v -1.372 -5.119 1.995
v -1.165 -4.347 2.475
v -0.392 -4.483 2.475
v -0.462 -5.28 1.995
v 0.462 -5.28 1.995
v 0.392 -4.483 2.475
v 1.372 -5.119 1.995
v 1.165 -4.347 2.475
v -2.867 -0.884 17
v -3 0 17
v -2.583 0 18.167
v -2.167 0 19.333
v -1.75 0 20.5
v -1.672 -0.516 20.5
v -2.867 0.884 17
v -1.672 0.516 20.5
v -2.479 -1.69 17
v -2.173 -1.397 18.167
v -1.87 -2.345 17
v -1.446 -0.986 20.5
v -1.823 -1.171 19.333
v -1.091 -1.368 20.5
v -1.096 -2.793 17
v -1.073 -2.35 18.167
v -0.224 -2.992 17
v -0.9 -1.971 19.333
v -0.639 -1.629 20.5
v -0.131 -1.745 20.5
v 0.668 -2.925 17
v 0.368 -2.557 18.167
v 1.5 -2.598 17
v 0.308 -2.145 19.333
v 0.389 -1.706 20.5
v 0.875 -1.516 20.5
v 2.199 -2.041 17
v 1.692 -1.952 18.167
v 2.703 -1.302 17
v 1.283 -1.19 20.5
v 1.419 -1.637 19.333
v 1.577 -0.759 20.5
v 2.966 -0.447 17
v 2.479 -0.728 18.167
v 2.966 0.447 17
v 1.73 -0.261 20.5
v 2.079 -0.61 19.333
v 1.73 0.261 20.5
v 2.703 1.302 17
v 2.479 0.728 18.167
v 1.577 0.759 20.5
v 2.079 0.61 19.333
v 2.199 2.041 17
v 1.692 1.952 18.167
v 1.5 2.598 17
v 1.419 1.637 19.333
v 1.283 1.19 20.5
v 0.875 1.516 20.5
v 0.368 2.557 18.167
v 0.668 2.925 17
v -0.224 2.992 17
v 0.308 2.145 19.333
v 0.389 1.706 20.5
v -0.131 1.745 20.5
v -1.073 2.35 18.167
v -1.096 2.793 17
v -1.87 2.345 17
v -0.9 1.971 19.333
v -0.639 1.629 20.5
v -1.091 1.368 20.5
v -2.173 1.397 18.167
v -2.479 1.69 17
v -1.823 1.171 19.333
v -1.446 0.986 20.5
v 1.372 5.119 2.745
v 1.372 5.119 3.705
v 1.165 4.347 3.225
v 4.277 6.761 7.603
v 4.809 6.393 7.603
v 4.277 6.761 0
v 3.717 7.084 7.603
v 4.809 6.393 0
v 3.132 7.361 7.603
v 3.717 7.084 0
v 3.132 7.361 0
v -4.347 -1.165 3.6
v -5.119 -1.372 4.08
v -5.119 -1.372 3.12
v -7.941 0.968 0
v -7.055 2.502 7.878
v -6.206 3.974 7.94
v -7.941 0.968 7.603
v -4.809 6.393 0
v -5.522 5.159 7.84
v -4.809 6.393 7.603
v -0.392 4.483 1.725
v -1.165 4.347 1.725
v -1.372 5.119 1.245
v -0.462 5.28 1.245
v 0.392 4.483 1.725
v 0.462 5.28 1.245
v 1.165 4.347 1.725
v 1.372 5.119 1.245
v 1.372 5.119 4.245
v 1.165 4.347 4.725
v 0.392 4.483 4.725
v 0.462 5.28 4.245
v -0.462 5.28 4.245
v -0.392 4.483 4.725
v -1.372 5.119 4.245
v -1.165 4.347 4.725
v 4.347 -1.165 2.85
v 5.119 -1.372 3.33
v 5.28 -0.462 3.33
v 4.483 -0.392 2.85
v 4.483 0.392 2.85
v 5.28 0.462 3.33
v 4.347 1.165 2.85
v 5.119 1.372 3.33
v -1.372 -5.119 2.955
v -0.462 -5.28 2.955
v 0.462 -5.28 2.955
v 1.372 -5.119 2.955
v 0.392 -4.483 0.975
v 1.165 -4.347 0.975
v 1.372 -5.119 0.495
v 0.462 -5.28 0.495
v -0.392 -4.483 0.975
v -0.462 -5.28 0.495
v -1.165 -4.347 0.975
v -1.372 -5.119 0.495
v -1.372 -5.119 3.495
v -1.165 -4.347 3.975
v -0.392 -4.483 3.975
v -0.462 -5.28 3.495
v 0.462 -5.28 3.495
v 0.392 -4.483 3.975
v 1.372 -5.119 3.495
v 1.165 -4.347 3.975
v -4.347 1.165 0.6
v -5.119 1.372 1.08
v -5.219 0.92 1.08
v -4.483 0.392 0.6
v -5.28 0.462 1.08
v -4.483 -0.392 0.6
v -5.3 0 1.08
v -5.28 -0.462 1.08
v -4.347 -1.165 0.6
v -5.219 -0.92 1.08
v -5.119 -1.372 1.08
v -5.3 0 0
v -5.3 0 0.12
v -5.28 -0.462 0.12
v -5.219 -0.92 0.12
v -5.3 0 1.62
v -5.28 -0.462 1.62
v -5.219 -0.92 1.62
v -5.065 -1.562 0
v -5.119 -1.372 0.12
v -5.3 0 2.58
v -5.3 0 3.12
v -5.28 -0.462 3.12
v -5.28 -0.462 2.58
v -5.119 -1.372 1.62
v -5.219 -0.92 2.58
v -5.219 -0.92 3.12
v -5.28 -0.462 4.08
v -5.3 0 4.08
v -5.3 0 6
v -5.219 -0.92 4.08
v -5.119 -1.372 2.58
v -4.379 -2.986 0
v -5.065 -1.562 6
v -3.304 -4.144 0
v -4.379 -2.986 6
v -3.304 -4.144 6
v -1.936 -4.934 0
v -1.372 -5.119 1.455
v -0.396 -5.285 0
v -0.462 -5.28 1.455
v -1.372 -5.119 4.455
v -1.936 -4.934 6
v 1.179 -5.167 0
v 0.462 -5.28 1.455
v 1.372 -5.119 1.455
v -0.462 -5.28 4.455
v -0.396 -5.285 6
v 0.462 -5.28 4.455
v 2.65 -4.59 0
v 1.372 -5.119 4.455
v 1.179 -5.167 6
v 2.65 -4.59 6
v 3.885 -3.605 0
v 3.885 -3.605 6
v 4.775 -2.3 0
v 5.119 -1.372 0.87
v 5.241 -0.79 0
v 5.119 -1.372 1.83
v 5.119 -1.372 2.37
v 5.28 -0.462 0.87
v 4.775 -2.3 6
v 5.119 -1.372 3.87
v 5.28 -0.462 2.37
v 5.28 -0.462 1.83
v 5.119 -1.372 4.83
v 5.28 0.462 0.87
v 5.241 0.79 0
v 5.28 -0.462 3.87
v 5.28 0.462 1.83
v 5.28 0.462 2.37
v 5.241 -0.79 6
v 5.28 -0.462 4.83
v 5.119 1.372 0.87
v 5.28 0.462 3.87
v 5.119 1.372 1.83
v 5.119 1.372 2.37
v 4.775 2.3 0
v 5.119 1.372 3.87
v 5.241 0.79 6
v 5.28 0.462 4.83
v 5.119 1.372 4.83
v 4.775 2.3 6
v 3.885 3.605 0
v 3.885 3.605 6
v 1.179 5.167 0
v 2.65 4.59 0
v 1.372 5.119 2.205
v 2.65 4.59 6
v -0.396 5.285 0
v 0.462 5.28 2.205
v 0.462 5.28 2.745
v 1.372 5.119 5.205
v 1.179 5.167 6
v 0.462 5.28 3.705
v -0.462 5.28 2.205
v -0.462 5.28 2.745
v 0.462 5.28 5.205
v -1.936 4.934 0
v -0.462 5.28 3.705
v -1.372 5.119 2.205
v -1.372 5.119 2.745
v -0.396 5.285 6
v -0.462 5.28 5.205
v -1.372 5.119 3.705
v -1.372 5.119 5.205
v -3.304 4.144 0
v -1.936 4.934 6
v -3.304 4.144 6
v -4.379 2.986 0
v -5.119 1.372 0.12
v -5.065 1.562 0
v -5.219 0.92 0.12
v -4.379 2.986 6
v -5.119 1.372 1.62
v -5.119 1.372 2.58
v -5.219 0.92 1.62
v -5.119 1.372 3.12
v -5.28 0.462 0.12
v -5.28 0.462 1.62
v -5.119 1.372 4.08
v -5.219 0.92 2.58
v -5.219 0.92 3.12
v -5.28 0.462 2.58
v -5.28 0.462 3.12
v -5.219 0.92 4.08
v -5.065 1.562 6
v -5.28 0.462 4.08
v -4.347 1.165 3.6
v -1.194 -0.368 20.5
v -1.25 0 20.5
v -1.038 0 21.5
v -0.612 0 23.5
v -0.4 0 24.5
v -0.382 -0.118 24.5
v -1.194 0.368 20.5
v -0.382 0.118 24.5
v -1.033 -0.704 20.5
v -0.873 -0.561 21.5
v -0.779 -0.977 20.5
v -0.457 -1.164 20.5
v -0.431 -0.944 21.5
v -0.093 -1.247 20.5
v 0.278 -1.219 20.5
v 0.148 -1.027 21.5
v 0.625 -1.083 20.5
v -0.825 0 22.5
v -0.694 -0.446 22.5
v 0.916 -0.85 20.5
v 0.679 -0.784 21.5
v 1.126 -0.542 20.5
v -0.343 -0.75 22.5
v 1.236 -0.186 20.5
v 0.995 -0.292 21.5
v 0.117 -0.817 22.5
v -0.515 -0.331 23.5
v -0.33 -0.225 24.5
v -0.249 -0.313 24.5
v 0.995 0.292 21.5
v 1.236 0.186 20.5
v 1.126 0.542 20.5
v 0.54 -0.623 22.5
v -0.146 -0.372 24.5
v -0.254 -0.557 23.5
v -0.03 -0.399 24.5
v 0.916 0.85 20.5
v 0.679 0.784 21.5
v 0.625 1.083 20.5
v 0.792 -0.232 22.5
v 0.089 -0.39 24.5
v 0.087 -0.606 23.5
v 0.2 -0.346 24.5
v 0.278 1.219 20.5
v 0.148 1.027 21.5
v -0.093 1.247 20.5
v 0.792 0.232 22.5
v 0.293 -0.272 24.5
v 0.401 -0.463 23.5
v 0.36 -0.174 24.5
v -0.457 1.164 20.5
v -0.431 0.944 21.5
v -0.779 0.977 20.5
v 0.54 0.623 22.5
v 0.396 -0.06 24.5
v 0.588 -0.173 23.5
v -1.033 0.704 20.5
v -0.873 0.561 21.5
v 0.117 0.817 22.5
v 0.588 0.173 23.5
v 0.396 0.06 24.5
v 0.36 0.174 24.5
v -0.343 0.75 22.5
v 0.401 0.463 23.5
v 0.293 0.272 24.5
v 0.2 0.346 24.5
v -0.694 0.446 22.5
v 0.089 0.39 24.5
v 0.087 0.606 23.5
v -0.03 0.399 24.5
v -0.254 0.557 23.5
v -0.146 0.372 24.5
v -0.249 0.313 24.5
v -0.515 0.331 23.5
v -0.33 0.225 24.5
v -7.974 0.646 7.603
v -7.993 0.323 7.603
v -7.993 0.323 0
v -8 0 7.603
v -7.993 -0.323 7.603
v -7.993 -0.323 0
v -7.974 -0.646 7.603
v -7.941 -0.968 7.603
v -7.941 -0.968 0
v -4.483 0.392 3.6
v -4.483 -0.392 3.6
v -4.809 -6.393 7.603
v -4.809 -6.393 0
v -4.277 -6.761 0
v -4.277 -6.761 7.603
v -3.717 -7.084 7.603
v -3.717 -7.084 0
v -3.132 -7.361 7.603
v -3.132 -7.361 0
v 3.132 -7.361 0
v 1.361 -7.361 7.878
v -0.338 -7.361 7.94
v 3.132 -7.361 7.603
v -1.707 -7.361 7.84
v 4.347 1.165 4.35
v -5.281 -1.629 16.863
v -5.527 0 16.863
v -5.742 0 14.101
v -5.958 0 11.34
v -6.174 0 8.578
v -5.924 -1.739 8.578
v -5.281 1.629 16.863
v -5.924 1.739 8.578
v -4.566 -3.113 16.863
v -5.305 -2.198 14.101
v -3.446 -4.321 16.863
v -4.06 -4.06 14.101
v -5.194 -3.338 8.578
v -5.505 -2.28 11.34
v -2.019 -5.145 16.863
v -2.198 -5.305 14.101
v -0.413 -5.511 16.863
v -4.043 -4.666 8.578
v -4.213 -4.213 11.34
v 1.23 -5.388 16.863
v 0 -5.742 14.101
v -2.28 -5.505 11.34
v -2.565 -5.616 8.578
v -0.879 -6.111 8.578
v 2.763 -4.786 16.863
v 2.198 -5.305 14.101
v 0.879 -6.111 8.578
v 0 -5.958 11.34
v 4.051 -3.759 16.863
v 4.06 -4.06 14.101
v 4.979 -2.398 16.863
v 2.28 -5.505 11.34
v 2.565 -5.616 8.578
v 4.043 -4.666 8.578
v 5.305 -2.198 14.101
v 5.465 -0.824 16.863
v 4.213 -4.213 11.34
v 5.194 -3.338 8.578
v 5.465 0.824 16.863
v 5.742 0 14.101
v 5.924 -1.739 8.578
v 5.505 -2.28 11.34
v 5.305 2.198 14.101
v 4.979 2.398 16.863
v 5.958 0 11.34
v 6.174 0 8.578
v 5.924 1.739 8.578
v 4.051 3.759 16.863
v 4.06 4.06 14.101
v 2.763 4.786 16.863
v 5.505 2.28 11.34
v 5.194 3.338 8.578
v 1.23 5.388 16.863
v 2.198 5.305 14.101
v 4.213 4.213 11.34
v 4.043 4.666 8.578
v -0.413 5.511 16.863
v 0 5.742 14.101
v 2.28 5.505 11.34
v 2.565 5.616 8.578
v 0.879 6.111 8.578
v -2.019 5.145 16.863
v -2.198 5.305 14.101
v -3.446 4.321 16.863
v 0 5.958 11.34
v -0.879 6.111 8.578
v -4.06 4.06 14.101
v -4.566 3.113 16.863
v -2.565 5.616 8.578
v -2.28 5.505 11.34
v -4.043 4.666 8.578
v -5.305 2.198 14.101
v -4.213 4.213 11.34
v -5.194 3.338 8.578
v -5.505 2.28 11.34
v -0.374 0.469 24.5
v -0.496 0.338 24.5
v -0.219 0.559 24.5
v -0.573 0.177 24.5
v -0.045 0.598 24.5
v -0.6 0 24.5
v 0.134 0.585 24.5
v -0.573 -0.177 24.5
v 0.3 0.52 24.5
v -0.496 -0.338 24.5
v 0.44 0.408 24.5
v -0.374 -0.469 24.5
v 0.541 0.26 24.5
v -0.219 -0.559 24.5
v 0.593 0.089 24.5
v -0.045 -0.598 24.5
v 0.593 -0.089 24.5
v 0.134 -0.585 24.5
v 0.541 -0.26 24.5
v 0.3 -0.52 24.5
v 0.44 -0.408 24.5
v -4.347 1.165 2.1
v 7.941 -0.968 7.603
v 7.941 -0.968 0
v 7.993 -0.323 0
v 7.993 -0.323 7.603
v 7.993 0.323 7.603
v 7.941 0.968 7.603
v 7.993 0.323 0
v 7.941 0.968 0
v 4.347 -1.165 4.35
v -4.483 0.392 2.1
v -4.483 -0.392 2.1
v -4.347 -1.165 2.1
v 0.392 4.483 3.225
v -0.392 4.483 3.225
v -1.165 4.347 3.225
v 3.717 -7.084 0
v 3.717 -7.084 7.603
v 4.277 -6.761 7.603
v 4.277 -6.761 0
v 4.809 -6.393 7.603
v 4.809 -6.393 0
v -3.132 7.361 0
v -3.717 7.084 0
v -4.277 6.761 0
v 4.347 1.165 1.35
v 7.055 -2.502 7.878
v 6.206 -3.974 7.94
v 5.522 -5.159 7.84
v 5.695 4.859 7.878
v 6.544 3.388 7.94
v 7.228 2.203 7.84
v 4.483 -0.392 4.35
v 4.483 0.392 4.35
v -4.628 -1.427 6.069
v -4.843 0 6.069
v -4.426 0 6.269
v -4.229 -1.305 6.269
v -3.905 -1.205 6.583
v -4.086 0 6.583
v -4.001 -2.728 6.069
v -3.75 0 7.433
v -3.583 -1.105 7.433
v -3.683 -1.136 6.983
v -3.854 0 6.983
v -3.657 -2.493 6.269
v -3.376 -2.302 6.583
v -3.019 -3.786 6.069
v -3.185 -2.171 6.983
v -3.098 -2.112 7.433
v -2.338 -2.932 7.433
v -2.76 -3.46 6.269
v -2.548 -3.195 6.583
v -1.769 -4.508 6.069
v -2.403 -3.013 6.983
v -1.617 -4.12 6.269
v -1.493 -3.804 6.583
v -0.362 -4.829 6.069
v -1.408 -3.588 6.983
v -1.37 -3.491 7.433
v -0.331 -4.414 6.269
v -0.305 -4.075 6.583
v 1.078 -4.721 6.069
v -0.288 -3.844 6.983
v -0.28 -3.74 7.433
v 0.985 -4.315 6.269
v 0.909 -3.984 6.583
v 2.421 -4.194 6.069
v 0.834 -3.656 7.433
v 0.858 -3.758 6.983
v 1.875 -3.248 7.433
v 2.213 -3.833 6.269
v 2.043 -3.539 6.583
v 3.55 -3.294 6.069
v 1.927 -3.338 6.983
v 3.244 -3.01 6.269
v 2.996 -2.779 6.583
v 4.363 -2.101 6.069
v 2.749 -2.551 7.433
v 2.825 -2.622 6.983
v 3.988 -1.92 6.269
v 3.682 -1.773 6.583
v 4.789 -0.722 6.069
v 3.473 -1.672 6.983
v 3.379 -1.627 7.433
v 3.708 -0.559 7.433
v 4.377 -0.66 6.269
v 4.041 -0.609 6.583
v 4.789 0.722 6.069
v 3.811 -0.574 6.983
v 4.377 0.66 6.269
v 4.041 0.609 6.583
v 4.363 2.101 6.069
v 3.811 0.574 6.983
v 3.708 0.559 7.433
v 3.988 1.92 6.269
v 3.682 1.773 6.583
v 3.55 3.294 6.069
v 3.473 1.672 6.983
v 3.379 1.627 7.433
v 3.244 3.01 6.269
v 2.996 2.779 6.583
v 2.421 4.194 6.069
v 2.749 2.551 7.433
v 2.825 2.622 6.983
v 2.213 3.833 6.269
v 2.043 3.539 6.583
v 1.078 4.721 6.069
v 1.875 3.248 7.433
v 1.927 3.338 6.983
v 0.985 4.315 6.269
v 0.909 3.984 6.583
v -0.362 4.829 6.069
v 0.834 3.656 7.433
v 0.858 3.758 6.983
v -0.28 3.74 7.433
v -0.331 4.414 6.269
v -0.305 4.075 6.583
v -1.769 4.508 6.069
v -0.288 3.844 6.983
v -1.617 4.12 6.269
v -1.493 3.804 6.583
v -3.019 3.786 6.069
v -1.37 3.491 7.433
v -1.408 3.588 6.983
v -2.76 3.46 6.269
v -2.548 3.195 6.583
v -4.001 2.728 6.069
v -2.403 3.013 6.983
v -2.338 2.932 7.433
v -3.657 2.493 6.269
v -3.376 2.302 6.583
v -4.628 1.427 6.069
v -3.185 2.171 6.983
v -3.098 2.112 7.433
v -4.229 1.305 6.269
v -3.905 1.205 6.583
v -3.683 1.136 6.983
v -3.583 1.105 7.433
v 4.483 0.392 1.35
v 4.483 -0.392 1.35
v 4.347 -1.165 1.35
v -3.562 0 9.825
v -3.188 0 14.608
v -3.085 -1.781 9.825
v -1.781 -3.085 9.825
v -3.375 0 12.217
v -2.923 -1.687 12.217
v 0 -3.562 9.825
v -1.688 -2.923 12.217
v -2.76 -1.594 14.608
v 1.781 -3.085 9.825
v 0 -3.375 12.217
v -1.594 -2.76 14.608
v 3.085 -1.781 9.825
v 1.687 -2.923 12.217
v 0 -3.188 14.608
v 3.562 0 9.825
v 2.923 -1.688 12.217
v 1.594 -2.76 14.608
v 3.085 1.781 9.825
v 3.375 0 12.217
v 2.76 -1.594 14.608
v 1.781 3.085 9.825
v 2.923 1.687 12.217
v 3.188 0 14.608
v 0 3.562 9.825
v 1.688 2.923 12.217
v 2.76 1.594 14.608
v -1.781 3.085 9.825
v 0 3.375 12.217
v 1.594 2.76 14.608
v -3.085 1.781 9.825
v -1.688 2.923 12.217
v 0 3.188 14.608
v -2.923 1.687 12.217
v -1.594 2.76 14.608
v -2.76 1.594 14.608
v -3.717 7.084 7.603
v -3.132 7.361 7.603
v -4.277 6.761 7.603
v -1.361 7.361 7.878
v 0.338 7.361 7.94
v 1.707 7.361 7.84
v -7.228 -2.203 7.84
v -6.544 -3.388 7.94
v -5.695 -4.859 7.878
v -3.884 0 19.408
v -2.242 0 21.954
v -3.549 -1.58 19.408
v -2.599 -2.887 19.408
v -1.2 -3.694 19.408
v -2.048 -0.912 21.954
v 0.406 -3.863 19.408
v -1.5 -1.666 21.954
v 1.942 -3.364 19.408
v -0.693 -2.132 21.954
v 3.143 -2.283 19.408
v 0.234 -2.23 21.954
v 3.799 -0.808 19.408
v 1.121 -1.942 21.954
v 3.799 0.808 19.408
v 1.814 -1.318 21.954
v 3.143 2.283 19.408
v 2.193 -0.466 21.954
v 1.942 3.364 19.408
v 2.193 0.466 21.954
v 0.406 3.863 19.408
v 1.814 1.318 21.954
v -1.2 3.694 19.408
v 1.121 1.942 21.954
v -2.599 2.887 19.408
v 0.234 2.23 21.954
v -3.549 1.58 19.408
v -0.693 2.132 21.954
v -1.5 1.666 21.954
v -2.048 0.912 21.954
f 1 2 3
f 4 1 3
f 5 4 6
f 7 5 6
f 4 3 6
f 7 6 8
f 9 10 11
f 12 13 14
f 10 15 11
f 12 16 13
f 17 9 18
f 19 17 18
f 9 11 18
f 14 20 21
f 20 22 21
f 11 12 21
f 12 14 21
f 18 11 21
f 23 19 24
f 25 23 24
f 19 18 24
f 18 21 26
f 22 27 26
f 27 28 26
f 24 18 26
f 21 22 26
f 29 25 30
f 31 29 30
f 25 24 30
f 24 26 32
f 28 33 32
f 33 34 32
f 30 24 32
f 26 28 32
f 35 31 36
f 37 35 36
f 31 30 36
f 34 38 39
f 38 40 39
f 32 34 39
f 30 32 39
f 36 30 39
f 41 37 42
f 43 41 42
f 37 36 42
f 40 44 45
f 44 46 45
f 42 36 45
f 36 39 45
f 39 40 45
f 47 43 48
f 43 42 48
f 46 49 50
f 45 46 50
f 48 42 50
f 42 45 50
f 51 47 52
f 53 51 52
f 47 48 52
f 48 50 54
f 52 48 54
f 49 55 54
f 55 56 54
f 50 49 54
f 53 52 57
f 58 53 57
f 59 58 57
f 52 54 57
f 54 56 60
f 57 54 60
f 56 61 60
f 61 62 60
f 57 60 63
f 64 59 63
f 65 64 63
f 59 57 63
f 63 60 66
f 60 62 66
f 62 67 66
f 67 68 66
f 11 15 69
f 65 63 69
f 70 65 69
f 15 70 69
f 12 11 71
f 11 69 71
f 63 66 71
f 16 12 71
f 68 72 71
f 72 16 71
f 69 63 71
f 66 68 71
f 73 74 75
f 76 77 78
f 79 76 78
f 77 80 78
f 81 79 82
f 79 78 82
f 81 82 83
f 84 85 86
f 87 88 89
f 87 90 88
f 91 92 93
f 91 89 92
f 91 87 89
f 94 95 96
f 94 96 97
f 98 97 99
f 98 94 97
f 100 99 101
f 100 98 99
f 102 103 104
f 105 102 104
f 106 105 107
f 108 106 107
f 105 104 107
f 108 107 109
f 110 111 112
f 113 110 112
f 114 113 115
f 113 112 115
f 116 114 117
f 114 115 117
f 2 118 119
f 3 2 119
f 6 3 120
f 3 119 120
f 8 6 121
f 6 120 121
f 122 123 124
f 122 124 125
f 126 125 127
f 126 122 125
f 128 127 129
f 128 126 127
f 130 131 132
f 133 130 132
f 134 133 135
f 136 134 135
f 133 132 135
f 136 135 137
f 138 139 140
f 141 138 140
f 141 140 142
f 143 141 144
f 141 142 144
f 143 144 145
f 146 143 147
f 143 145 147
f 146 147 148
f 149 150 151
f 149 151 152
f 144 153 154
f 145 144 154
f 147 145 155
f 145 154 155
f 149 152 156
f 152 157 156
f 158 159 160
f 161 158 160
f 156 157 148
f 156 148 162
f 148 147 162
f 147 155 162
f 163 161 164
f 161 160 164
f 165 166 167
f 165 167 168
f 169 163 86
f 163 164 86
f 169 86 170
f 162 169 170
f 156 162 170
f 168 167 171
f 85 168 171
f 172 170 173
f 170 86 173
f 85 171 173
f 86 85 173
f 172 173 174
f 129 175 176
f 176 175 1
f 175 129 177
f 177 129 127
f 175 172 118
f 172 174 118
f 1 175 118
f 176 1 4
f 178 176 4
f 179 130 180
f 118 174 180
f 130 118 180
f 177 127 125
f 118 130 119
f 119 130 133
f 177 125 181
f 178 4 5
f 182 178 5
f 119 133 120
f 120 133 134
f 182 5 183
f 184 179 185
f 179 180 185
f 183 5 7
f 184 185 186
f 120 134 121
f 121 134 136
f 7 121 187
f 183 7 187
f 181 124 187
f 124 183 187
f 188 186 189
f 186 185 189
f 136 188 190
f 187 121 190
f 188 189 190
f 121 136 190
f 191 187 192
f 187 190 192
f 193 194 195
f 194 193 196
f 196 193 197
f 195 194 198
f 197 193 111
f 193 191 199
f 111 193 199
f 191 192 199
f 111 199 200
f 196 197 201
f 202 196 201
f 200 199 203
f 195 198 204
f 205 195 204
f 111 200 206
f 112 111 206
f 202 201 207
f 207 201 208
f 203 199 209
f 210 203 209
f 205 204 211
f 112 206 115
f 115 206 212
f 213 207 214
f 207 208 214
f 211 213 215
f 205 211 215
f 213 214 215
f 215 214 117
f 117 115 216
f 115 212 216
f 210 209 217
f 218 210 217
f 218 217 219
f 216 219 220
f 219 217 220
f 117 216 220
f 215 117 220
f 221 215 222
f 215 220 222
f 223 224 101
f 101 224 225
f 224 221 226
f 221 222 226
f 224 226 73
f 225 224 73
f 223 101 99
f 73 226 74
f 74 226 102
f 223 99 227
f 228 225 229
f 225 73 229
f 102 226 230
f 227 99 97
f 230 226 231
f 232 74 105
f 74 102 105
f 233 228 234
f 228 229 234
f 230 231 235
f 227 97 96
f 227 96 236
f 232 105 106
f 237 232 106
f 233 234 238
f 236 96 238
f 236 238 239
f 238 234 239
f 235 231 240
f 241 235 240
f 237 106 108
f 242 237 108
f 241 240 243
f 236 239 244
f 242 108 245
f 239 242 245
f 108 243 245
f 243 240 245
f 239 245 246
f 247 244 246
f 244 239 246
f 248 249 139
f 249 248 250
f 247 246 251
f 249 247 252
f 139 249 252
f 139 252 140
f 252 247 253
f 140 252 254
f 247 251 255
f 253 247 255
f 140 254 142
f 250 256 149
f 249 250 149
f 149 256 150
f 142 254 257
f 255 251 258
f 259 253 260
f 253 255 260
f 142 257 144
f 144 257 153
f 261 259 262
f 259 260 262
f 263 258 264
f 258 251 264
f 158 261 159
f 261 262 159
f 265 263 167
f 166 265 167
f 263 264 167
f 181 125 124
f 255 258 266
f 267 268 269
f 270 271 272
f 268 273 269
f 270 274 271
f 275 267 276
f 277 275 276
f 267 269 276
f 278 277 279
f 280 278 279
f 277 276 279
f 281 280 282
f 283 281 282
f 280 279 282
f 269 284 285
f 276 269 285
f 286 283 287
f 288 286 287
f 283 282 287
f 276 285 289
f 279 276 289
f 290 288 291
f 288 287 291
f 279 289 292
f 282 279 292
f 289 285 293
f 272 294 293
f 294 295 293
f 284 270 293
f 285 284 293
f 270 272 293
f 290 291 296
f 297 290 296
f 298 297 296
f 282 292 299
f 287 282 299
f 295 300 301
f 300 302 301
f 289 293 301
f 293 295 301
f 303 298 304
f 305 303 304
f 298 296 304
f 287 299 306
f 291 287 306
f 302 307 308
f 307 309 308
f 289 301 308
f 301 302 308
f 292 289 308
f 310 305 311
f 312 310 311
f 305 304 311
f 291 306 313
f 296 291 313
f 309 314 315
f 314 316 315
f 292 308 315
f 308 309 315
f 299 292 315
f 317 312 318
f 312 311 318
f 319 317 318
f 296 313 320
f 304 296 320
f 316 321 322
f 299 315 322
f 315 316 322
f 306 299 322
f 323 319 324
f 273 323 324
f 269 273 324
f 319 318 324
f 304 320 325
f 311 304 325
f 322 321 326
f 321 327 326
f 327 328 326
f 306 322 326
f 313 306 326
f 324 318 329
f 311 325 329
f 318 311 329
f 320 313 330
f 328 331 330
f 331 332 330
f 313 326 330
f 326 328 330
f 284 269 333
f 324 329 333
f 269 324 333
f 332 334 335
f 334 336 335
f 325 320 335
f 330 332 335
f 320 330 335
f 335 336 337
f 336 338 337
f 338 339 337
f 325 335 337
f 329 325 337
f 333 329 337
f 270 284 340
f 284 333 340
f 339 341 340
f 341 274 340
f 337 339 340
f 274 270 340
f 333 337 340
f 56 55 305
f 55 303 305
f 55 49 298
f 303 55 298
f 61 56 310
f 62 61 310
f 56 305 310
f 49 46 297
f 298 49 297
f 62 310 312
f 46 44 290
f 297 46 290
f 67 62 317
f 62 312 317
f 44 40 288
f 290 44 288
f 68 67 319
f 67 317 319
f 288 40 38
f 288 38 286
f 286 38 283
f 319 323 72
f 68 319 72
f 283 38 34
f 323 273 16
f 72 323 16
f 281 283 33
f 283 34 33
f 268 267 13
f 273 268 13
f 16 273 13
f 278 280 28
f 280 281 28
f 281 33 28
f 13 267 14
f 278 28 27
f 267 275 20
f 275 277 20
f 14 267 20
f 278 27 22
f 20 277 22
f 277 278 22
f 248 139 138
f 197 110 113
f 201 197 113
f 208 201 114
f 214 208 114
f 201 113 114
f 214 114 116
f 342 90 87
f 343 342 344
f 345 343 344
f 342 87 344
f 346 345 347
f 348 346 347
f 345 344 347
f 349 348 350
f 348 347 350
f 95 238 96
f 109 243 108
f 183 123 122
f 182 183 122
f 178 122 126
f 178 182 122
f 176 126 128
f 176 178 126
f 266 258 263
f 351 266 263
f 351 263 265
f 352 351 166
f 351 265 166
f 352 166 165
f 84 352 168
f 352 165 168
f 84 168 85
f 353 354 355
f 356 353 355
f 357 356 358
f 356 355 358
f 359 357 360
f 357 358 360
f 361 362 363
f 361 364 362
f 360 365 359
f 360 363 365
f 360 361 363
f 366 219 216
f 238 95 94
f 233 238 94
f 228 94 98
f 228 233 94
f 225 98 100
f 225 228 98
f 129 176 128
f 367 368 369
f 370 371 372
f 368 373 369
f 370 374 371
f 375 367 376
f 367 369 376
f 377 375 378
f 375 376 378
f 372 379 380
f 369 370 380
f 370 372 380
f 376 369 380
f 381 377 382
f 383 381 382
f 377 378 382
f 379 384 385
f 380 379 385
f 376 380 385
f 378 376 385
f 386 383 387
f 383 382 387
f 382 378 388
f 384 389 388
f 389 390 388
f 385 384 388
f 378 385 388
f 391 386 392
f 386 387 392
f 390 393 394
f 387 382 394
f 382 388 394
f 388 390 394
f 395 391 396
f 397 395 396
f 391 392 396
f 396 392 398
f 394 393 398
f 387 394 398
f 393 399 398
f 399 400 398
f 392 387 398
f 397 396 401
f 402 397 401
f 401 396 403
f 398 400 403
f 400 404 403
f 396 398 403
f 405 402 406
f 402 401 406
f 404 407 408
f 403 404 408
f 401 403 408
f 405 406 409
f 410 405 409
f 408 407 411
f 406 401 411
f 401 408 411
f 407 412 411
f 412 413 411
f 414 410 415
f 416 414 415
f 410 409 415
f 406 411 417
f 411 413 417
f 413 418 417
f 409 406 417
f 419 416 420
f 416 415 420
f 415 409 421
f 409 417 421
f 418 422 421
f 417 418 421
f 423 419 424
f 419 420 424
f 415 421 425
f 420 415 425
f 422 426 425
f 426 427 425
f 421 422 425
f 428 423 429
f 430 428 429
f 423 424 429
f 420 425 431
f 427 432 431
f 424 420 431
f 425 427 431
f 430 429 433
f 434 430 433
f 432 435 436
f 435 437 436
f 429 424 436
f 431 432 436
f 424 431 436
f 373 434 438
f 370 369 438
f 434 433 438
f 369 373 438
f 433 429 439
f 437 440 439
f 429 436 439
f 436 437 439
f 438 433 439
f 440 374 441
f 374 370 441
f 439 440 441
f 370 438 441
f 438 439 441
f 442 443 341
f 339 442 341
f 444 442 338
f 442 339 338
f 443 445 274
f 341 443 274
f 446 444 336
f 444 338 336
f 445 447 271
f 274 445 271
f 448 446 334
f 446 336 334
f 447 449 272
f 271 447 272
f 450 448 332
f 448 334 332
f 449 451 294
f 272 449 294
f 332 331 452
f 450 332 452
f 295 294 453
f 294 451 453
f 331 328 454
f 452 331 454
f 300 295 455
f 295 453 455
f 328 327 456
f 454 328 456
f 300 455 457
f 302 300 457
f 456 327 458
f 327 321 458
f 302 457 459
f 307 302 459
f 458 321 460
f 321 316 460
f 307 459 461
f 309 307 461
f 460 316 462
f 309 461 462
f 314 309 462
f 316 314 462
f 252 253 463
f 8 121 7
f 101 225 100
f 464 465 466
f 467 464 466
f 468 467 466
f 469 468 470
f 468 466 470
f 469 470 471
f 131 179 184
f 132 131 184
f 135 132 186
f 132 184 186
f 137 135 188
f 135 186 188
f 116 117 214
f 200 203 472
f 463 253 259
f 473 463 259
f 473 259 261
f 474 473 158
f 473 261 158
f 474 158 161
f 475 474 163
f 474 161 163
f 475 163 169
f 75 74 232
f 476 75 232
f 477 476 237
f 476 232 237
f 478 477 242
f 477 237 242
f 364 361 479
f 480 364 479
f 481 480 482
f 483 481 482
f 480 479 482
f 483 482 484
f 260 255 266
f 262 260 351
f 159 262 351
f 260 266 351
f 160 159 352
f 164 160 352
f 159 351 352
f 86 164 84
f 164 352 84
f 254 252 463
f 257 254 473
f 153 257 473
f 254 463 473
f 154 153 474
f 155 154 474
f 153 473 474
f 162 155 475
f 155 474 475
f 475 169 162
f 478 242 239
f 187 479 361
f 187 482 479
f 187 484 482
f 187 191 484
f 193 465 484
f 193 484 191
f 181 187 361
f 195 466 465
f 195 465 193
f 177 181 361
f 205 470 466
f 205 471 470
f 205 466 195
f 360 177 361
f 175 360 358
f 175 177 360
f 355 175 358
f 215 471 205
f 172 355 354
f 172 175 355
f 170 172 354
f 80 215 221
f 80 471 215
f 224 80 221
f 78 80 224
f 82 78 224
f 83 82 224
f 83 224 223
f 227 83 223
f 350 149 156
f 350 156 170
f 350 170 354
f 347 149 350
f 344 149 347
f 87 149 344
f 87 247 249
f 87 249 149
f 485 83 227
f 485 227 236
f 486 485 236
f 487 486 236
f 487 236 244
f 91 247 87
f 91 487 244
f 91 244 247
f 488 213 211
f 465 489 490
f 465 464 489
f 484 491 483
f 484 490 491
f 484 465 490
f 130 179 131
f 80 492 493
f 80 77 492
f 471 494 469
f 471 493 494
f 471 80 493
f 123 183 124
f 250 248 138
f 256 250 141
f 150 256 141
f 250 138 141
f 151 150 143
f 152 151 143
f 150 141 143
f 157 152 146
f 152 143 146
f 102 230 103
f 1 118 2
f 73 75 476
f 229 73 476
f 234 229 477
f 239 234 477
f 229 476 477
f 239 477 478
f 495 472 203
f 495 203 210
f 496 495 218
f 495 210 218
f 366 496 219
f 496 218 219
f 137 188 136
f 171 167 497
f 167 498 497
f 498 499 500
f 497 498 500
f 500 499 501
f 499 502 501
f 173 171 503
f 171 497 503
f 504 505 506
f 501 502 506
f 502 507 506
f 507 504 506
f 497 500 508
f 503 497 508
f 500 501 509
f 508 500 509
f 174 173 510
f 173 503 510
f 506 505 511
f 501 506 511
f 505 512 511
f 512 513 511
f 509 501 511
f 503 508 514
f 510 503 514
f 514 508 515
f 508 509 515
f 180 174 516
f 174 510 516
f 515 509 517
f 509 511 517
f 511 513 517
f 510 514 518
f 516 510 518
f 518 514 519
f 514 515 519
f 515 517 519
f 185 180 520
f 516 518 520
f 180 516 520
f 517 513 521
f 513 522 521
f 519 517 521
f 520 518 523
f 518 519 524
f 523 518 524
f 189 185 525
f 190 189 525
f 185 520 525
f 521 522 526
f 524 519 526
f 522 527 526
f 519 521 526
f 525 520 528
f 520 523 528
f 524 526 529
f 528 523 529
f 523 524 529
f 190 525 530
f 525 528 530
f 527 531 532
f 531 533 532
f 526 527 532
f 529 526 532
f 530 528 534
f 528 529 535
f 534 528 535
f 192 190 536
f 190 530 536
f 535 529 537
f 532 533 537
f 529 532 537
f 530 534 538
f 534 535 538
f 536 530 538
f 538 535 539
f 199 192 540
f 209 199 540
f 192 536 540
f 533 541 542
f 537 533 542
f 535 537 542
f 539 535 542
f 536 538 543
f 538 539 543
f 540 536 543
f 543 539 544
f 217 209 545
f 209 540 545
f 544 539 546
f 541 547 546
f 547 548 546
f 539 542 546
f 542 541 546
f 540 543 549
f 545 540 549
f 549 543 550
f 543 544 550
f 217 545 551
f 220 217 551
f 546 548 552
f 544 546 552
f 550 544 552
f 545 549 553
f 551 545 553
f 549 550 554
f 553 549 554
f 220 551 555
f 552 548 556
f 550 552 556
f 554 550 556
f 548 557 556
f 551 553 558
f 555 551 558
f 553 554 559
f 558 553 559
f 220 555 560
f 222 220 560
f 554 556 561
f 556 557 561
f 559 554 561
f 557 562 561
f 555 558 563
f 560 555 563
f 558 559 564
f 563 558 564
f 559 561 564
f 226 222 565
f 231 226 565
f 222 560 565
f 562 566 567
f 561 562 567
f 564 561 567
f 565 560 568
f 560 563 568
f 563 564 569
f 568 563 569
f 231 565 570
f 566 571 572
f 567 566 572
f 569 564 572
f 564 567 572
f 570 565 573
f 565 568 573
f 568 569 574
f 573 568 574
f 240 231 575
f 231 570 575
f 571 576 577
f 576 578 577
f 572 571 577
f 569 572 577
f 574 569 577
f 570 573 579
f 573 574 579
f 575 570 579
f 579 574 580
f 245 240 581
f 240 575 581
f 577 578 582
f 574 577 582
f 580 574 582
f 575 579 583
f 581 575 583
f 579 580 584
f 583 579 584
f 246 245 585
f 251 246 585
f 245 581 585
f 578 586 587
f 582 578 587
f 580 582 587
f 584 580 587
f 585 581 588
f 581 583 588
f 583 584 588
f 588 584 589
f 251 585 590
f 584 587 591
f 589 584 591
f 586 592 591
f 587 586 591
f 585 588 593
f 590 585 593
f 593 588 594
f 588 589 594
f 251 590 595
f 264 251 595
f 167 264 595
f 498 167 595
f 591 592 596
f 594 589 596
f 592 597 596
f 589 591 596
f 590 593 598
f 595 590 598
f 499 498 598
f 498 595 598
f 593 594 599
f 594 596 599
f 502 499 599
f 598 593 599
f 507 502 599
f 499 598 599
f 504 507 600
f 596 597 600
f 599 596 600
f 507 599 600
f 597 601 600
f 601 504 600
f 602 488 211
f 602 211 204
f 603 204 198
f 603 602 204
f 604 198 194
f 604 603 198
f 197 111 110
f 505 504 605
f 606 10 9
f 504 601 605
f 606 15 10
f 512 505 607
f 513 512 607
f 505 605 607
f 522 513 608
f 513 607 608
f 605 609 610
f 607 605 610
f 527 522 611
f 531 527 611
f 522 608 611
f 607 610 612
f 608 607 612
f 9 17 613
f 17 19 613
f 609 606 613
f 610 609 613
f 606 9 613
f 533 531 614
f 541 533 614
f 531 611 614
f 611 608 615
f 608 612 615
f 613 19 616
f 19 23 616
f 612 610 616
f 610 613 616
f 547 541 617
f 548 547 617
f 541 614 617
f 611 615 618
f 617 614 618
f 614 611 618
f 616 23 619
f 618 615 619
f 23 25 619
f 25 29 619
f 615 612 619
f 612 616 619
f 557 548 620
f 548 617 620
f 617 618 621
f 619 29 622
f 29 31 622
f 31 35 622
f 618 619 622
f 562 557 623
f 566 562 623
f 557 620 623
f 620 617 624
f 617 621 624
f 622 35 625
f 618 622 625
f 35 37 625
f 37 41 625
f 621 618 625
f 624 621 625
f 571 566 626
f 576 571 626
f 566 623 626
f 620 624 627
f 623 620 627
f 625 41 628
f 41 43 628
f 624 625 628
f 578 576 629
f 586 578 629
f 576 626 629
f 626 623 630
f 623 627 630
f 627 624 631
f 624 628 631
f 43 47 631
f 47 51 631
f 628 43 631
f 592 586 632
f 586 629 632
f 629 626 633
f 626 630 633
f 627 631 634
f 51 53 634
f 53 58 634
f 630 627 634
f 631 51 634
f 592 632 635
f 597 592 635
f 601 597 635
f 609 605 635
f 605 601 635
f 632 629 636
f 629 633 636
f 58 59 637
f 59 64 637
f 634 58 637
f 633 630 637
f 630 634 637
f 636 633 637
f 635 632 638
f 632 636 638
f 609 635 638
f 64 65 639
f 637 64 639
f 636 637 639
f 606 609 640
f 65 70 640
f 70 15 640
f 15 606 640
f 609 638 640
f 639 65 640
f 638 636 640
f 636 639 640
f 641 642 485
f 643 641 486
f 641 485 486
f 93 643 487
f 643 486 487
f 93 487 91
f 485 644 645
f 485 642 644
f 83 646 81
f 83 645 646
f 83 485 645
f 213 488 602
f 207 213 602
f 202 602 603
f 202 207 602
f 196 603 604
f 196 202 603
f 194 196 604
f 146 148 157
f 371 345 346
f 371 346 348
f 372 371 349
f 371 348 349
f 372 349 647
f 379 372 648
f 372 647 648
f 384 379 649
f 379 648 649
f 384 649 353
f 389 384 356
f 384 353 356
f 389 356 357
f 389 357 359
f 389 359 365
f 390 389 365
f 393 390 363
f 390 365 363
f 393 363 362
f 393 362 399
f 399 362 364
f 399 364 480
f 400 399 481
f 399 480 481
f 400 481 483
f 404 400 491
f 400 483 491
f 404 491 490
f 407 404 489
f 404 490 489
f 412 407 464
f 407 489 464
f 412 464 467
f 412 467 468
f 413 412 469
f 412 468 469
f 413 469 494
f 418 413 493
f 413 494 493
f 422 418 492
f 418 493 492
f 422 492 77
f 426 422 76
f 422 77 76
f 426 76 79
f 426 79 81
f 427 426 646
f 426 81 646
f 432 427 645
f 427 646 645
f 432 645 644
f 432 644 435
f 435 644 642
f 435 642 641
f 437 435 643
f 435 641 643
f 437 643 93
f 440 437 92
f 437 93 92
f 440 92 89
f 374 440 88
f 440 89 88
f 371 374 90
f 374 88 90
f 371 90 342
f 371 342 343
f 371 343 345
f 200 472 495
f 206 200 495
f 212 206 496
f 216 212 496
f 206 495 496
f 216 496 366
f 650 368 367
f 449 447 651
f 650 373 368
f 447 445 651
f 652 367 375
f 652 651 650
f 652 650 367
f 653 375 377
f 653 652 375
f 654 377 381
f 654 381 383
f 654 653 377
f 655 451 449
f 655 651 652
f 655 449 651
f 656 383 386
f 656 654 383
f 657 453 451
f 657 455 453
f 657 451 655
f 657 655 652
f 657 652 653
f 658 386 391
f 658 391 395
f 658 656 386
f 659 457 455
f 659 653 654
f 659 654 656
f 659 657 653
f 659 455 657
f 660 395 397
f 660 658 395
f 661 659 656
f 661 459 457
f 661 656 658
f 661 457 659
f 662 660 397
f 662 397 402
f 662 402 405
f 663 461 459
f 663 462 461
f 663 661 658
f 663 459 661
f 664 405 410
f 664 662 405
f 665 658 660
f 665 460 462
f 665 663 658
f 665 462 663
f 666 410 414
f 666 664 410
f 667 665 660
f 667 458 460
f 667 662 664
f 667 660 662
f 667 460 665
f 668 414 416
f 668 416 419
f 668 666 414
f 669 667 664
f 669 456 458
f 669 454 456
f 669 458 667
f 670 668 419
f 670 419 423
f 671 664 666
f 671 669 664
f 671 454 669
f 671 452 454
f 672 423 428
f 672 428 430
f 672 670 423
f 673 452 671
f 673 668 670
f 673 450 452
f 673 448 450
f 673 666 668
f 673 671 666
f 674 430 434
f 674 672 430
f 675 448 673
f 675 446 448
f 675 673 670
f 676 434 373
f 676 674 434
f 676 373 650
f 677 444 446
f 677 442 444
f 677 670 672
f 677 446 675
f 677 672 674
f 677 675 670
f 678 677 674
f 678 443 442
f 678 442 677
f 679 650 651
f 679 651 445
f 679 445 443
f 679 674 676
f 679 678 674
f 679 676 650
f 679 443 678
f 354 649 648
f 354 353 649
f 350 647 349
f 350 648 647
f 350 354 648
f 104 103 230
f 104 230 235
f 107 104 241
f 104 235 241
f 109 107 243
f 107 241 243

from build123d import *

# Parameters (mm, degrees)
SKETCH001_R         = 14.291544
POCKET_DEPTH        = 24.501
REVOLUTION001_ANGLE = 30
REVOLUTION002_ANGLE = 30
REVOLUTION003_ANGLE = 30
REVOLUTION004_ANGLE = 30


with BuildPart() as part:
    # Sketch → Revolution (revolve)
    with BuildSketch(Plane.XZ):
        with BuildLine():
            Line((-5.3, 0), (-5.3, 6))
            ThreePointArc((-5.3, 6), (-4.244457, 6.413224), (-3.75, 7.433241))
            Line((-3.75, 7.433241), (-3, 17))
            Line((-3, 17), (-1.75, 20.5))
            Line((-1.75, 20.5), (-1.25, 20.5))
            Line((-1.25, 20.5), (-0.4, 24.5))
            Line((-0.4, 24.5), (-0.6, 24.5))
            Line((-5.526565, 16.862743), (-0.6, 24.5))
            Line((-5.526565, 16.862743), (-6.174059, 8.578152))
            Line((-6.174059, 8.578152), (-8, 7.60349))
            Line((-8, 7.60349), (-8, 0))
            Line((-5.3, 0), (-8, 0))
        make_face()
    revolve(axis=Axis((0, 0, 0), (0, 0, 1)))

    # Sketch001 (on Face12 of Revolution) → Pocket (cut, through all)
    with BuildSketch(Plane(origin=(0, 0, 0), x_dir=(1, 0, 0), z_dir=(0, 0, -1))):
        Circle(SKETCH001_R)
        Polygon((8.5, 0), (4.25, 7.361216), (-4.25, 7.361216), (-8.5, 0), (-4.25, -7.361216), (4.25, -7.361216), align=None, mode=Mode.SUBTRACT)
    extrude(amount=-POCKET_DEPTH, mode=Mode.SUBTRACT)

    # Sketch002 → Revolution001 (revolve, symmetric)
    with BuildSketch(Plane.XZ) as revolution001_sk:
        Polygon((-5.5, 0), (-4.5, 0.6), (-5.5, 1.2), (-6.5, 1.2), (-6.5, 0), align=None)
        Polygon((-5.5, 1.5), (-4.5, 2.1), (-5.5, 2.7), (-6.5, 2.7), (-6.5, 1.5), align=None)
        Polygon((-5.5, 3), (-4.5, 3.6), (-5.5, 4.2), (-6.5, 4.2), (-6.5, 3), align=None)
    revolve(axis=Axis((0, 0, 0), (0, 0, 1)), revolution_arc=REVOLUTION001_ANGLE / 2)
    revolve(revolution001_sk.sketch, axis=Axis((0, 0, 0), (0, 0, -1)), revolution_arc=REVOLUTION001_ANGLE / 2)

    # Sketch003 → Revolution002 (revolve, symmetric)
    with BuildSketch(Plane(origin=(0, 0, 0.375), x_dir=(0, 1, 0), z_dir=(1, 0, 0))) as revolution002_sk:
        Polygon((-5.5, 0), (-4.5, 0.6), (-5.5, 1.2), (-6.5, 1.2), (-6.5, 0), align=None)
        Polygon((-5.5, 1.5), (-4.5, 2.1), (-5.5, 2.7), (-6.5, 2.7), (-6.5, 1.5), align=None)
        Polygon((-5.5, 3), (-4.5, 3.6), (-5.5, 4.2), (-6.5, 4.2), (-6.5, 3), align=None)
    revolve(axis=Axis((0, 0, 0.375), (0, 0, 1)), revolution_arc=REVOLUTION002_ANGLE / 2)
    revolve(revolution002_sk.sketch, axis=Axis((0, 0, 0.375), (0, 0, -1)), revolution_arc=REVOLUTION002_ANGLE / 2)

    # Sketch004 → Revolution003 (revolve, symmetric)
    with BuildSketch(Plane(origin=(0, 0, 0.75), x_dir=(-1, 0, 0), z_dir=(0, 1, 0))) as revolution003_sk:
        Polygon((-5.5, 0), (-4.5, 0.6), (-5.5, 1.2), (-6.5, 1.2), (-6.5, 0), align=None)
        Polygon((-5.5, 1.5), (-4.5, 2.1), (-5.5, 2.7), (-6.5, 2.7), (-6.5, 1.5), align=None)
        Polygon((-5.5, 3), (-4.5, 3.6), (-5.5, 4.2), (-6.5, 4.2), (-6.5, 3), align=None)
    revolve(axis=Axis((0, 0, 0.75), (0, 0, 1)), revolution_arc=REVOLUTION003_ANGLE / 2)
    revolve(revolution003_sk.sketch, axis=Axis((0, 0, 0.75), (0, 0, -1)), revolution_arc=REVOLUTION003_ANGLE / 2)

    # Sketch005 → Revolution004 (revolve, symmetric)
    with BuildSketch(Plane(origin=(0, 0, 1.125), x_dir=(0, -1, 0), z_dir=(-1, 0, 0))) as revolution004_sk:
        Polygon((-5.5, 0), (-4.5, 0.6), (-5.5, 1.2), (-6.5, 1.2), (-6.5, 0), align=None)
        Polygon((-5.5, 1.5), (-4.5, 2.1), (-5.5, 2.7), (-6.5, 2.7), (-6.5, 1.5), align=None)
        Polygon((-5.5, 3), (-4.5, 3.6), (-5.5, 4.2), (-6.5, 4.2), (-6.5, 3), align=None)
    revolve(axis=Axis((0, 0, 1.125), (0, 0, 1)), revolution_arc=REVOLUTION004_ANGLE / 2)
    revolve(revolution004_sk.sketch, axis=Axis((0, 0, 1.125), (0, 0, -1)), revolution_arc=REVOLUTION004_ANGLE / 2)


solid = part.part
